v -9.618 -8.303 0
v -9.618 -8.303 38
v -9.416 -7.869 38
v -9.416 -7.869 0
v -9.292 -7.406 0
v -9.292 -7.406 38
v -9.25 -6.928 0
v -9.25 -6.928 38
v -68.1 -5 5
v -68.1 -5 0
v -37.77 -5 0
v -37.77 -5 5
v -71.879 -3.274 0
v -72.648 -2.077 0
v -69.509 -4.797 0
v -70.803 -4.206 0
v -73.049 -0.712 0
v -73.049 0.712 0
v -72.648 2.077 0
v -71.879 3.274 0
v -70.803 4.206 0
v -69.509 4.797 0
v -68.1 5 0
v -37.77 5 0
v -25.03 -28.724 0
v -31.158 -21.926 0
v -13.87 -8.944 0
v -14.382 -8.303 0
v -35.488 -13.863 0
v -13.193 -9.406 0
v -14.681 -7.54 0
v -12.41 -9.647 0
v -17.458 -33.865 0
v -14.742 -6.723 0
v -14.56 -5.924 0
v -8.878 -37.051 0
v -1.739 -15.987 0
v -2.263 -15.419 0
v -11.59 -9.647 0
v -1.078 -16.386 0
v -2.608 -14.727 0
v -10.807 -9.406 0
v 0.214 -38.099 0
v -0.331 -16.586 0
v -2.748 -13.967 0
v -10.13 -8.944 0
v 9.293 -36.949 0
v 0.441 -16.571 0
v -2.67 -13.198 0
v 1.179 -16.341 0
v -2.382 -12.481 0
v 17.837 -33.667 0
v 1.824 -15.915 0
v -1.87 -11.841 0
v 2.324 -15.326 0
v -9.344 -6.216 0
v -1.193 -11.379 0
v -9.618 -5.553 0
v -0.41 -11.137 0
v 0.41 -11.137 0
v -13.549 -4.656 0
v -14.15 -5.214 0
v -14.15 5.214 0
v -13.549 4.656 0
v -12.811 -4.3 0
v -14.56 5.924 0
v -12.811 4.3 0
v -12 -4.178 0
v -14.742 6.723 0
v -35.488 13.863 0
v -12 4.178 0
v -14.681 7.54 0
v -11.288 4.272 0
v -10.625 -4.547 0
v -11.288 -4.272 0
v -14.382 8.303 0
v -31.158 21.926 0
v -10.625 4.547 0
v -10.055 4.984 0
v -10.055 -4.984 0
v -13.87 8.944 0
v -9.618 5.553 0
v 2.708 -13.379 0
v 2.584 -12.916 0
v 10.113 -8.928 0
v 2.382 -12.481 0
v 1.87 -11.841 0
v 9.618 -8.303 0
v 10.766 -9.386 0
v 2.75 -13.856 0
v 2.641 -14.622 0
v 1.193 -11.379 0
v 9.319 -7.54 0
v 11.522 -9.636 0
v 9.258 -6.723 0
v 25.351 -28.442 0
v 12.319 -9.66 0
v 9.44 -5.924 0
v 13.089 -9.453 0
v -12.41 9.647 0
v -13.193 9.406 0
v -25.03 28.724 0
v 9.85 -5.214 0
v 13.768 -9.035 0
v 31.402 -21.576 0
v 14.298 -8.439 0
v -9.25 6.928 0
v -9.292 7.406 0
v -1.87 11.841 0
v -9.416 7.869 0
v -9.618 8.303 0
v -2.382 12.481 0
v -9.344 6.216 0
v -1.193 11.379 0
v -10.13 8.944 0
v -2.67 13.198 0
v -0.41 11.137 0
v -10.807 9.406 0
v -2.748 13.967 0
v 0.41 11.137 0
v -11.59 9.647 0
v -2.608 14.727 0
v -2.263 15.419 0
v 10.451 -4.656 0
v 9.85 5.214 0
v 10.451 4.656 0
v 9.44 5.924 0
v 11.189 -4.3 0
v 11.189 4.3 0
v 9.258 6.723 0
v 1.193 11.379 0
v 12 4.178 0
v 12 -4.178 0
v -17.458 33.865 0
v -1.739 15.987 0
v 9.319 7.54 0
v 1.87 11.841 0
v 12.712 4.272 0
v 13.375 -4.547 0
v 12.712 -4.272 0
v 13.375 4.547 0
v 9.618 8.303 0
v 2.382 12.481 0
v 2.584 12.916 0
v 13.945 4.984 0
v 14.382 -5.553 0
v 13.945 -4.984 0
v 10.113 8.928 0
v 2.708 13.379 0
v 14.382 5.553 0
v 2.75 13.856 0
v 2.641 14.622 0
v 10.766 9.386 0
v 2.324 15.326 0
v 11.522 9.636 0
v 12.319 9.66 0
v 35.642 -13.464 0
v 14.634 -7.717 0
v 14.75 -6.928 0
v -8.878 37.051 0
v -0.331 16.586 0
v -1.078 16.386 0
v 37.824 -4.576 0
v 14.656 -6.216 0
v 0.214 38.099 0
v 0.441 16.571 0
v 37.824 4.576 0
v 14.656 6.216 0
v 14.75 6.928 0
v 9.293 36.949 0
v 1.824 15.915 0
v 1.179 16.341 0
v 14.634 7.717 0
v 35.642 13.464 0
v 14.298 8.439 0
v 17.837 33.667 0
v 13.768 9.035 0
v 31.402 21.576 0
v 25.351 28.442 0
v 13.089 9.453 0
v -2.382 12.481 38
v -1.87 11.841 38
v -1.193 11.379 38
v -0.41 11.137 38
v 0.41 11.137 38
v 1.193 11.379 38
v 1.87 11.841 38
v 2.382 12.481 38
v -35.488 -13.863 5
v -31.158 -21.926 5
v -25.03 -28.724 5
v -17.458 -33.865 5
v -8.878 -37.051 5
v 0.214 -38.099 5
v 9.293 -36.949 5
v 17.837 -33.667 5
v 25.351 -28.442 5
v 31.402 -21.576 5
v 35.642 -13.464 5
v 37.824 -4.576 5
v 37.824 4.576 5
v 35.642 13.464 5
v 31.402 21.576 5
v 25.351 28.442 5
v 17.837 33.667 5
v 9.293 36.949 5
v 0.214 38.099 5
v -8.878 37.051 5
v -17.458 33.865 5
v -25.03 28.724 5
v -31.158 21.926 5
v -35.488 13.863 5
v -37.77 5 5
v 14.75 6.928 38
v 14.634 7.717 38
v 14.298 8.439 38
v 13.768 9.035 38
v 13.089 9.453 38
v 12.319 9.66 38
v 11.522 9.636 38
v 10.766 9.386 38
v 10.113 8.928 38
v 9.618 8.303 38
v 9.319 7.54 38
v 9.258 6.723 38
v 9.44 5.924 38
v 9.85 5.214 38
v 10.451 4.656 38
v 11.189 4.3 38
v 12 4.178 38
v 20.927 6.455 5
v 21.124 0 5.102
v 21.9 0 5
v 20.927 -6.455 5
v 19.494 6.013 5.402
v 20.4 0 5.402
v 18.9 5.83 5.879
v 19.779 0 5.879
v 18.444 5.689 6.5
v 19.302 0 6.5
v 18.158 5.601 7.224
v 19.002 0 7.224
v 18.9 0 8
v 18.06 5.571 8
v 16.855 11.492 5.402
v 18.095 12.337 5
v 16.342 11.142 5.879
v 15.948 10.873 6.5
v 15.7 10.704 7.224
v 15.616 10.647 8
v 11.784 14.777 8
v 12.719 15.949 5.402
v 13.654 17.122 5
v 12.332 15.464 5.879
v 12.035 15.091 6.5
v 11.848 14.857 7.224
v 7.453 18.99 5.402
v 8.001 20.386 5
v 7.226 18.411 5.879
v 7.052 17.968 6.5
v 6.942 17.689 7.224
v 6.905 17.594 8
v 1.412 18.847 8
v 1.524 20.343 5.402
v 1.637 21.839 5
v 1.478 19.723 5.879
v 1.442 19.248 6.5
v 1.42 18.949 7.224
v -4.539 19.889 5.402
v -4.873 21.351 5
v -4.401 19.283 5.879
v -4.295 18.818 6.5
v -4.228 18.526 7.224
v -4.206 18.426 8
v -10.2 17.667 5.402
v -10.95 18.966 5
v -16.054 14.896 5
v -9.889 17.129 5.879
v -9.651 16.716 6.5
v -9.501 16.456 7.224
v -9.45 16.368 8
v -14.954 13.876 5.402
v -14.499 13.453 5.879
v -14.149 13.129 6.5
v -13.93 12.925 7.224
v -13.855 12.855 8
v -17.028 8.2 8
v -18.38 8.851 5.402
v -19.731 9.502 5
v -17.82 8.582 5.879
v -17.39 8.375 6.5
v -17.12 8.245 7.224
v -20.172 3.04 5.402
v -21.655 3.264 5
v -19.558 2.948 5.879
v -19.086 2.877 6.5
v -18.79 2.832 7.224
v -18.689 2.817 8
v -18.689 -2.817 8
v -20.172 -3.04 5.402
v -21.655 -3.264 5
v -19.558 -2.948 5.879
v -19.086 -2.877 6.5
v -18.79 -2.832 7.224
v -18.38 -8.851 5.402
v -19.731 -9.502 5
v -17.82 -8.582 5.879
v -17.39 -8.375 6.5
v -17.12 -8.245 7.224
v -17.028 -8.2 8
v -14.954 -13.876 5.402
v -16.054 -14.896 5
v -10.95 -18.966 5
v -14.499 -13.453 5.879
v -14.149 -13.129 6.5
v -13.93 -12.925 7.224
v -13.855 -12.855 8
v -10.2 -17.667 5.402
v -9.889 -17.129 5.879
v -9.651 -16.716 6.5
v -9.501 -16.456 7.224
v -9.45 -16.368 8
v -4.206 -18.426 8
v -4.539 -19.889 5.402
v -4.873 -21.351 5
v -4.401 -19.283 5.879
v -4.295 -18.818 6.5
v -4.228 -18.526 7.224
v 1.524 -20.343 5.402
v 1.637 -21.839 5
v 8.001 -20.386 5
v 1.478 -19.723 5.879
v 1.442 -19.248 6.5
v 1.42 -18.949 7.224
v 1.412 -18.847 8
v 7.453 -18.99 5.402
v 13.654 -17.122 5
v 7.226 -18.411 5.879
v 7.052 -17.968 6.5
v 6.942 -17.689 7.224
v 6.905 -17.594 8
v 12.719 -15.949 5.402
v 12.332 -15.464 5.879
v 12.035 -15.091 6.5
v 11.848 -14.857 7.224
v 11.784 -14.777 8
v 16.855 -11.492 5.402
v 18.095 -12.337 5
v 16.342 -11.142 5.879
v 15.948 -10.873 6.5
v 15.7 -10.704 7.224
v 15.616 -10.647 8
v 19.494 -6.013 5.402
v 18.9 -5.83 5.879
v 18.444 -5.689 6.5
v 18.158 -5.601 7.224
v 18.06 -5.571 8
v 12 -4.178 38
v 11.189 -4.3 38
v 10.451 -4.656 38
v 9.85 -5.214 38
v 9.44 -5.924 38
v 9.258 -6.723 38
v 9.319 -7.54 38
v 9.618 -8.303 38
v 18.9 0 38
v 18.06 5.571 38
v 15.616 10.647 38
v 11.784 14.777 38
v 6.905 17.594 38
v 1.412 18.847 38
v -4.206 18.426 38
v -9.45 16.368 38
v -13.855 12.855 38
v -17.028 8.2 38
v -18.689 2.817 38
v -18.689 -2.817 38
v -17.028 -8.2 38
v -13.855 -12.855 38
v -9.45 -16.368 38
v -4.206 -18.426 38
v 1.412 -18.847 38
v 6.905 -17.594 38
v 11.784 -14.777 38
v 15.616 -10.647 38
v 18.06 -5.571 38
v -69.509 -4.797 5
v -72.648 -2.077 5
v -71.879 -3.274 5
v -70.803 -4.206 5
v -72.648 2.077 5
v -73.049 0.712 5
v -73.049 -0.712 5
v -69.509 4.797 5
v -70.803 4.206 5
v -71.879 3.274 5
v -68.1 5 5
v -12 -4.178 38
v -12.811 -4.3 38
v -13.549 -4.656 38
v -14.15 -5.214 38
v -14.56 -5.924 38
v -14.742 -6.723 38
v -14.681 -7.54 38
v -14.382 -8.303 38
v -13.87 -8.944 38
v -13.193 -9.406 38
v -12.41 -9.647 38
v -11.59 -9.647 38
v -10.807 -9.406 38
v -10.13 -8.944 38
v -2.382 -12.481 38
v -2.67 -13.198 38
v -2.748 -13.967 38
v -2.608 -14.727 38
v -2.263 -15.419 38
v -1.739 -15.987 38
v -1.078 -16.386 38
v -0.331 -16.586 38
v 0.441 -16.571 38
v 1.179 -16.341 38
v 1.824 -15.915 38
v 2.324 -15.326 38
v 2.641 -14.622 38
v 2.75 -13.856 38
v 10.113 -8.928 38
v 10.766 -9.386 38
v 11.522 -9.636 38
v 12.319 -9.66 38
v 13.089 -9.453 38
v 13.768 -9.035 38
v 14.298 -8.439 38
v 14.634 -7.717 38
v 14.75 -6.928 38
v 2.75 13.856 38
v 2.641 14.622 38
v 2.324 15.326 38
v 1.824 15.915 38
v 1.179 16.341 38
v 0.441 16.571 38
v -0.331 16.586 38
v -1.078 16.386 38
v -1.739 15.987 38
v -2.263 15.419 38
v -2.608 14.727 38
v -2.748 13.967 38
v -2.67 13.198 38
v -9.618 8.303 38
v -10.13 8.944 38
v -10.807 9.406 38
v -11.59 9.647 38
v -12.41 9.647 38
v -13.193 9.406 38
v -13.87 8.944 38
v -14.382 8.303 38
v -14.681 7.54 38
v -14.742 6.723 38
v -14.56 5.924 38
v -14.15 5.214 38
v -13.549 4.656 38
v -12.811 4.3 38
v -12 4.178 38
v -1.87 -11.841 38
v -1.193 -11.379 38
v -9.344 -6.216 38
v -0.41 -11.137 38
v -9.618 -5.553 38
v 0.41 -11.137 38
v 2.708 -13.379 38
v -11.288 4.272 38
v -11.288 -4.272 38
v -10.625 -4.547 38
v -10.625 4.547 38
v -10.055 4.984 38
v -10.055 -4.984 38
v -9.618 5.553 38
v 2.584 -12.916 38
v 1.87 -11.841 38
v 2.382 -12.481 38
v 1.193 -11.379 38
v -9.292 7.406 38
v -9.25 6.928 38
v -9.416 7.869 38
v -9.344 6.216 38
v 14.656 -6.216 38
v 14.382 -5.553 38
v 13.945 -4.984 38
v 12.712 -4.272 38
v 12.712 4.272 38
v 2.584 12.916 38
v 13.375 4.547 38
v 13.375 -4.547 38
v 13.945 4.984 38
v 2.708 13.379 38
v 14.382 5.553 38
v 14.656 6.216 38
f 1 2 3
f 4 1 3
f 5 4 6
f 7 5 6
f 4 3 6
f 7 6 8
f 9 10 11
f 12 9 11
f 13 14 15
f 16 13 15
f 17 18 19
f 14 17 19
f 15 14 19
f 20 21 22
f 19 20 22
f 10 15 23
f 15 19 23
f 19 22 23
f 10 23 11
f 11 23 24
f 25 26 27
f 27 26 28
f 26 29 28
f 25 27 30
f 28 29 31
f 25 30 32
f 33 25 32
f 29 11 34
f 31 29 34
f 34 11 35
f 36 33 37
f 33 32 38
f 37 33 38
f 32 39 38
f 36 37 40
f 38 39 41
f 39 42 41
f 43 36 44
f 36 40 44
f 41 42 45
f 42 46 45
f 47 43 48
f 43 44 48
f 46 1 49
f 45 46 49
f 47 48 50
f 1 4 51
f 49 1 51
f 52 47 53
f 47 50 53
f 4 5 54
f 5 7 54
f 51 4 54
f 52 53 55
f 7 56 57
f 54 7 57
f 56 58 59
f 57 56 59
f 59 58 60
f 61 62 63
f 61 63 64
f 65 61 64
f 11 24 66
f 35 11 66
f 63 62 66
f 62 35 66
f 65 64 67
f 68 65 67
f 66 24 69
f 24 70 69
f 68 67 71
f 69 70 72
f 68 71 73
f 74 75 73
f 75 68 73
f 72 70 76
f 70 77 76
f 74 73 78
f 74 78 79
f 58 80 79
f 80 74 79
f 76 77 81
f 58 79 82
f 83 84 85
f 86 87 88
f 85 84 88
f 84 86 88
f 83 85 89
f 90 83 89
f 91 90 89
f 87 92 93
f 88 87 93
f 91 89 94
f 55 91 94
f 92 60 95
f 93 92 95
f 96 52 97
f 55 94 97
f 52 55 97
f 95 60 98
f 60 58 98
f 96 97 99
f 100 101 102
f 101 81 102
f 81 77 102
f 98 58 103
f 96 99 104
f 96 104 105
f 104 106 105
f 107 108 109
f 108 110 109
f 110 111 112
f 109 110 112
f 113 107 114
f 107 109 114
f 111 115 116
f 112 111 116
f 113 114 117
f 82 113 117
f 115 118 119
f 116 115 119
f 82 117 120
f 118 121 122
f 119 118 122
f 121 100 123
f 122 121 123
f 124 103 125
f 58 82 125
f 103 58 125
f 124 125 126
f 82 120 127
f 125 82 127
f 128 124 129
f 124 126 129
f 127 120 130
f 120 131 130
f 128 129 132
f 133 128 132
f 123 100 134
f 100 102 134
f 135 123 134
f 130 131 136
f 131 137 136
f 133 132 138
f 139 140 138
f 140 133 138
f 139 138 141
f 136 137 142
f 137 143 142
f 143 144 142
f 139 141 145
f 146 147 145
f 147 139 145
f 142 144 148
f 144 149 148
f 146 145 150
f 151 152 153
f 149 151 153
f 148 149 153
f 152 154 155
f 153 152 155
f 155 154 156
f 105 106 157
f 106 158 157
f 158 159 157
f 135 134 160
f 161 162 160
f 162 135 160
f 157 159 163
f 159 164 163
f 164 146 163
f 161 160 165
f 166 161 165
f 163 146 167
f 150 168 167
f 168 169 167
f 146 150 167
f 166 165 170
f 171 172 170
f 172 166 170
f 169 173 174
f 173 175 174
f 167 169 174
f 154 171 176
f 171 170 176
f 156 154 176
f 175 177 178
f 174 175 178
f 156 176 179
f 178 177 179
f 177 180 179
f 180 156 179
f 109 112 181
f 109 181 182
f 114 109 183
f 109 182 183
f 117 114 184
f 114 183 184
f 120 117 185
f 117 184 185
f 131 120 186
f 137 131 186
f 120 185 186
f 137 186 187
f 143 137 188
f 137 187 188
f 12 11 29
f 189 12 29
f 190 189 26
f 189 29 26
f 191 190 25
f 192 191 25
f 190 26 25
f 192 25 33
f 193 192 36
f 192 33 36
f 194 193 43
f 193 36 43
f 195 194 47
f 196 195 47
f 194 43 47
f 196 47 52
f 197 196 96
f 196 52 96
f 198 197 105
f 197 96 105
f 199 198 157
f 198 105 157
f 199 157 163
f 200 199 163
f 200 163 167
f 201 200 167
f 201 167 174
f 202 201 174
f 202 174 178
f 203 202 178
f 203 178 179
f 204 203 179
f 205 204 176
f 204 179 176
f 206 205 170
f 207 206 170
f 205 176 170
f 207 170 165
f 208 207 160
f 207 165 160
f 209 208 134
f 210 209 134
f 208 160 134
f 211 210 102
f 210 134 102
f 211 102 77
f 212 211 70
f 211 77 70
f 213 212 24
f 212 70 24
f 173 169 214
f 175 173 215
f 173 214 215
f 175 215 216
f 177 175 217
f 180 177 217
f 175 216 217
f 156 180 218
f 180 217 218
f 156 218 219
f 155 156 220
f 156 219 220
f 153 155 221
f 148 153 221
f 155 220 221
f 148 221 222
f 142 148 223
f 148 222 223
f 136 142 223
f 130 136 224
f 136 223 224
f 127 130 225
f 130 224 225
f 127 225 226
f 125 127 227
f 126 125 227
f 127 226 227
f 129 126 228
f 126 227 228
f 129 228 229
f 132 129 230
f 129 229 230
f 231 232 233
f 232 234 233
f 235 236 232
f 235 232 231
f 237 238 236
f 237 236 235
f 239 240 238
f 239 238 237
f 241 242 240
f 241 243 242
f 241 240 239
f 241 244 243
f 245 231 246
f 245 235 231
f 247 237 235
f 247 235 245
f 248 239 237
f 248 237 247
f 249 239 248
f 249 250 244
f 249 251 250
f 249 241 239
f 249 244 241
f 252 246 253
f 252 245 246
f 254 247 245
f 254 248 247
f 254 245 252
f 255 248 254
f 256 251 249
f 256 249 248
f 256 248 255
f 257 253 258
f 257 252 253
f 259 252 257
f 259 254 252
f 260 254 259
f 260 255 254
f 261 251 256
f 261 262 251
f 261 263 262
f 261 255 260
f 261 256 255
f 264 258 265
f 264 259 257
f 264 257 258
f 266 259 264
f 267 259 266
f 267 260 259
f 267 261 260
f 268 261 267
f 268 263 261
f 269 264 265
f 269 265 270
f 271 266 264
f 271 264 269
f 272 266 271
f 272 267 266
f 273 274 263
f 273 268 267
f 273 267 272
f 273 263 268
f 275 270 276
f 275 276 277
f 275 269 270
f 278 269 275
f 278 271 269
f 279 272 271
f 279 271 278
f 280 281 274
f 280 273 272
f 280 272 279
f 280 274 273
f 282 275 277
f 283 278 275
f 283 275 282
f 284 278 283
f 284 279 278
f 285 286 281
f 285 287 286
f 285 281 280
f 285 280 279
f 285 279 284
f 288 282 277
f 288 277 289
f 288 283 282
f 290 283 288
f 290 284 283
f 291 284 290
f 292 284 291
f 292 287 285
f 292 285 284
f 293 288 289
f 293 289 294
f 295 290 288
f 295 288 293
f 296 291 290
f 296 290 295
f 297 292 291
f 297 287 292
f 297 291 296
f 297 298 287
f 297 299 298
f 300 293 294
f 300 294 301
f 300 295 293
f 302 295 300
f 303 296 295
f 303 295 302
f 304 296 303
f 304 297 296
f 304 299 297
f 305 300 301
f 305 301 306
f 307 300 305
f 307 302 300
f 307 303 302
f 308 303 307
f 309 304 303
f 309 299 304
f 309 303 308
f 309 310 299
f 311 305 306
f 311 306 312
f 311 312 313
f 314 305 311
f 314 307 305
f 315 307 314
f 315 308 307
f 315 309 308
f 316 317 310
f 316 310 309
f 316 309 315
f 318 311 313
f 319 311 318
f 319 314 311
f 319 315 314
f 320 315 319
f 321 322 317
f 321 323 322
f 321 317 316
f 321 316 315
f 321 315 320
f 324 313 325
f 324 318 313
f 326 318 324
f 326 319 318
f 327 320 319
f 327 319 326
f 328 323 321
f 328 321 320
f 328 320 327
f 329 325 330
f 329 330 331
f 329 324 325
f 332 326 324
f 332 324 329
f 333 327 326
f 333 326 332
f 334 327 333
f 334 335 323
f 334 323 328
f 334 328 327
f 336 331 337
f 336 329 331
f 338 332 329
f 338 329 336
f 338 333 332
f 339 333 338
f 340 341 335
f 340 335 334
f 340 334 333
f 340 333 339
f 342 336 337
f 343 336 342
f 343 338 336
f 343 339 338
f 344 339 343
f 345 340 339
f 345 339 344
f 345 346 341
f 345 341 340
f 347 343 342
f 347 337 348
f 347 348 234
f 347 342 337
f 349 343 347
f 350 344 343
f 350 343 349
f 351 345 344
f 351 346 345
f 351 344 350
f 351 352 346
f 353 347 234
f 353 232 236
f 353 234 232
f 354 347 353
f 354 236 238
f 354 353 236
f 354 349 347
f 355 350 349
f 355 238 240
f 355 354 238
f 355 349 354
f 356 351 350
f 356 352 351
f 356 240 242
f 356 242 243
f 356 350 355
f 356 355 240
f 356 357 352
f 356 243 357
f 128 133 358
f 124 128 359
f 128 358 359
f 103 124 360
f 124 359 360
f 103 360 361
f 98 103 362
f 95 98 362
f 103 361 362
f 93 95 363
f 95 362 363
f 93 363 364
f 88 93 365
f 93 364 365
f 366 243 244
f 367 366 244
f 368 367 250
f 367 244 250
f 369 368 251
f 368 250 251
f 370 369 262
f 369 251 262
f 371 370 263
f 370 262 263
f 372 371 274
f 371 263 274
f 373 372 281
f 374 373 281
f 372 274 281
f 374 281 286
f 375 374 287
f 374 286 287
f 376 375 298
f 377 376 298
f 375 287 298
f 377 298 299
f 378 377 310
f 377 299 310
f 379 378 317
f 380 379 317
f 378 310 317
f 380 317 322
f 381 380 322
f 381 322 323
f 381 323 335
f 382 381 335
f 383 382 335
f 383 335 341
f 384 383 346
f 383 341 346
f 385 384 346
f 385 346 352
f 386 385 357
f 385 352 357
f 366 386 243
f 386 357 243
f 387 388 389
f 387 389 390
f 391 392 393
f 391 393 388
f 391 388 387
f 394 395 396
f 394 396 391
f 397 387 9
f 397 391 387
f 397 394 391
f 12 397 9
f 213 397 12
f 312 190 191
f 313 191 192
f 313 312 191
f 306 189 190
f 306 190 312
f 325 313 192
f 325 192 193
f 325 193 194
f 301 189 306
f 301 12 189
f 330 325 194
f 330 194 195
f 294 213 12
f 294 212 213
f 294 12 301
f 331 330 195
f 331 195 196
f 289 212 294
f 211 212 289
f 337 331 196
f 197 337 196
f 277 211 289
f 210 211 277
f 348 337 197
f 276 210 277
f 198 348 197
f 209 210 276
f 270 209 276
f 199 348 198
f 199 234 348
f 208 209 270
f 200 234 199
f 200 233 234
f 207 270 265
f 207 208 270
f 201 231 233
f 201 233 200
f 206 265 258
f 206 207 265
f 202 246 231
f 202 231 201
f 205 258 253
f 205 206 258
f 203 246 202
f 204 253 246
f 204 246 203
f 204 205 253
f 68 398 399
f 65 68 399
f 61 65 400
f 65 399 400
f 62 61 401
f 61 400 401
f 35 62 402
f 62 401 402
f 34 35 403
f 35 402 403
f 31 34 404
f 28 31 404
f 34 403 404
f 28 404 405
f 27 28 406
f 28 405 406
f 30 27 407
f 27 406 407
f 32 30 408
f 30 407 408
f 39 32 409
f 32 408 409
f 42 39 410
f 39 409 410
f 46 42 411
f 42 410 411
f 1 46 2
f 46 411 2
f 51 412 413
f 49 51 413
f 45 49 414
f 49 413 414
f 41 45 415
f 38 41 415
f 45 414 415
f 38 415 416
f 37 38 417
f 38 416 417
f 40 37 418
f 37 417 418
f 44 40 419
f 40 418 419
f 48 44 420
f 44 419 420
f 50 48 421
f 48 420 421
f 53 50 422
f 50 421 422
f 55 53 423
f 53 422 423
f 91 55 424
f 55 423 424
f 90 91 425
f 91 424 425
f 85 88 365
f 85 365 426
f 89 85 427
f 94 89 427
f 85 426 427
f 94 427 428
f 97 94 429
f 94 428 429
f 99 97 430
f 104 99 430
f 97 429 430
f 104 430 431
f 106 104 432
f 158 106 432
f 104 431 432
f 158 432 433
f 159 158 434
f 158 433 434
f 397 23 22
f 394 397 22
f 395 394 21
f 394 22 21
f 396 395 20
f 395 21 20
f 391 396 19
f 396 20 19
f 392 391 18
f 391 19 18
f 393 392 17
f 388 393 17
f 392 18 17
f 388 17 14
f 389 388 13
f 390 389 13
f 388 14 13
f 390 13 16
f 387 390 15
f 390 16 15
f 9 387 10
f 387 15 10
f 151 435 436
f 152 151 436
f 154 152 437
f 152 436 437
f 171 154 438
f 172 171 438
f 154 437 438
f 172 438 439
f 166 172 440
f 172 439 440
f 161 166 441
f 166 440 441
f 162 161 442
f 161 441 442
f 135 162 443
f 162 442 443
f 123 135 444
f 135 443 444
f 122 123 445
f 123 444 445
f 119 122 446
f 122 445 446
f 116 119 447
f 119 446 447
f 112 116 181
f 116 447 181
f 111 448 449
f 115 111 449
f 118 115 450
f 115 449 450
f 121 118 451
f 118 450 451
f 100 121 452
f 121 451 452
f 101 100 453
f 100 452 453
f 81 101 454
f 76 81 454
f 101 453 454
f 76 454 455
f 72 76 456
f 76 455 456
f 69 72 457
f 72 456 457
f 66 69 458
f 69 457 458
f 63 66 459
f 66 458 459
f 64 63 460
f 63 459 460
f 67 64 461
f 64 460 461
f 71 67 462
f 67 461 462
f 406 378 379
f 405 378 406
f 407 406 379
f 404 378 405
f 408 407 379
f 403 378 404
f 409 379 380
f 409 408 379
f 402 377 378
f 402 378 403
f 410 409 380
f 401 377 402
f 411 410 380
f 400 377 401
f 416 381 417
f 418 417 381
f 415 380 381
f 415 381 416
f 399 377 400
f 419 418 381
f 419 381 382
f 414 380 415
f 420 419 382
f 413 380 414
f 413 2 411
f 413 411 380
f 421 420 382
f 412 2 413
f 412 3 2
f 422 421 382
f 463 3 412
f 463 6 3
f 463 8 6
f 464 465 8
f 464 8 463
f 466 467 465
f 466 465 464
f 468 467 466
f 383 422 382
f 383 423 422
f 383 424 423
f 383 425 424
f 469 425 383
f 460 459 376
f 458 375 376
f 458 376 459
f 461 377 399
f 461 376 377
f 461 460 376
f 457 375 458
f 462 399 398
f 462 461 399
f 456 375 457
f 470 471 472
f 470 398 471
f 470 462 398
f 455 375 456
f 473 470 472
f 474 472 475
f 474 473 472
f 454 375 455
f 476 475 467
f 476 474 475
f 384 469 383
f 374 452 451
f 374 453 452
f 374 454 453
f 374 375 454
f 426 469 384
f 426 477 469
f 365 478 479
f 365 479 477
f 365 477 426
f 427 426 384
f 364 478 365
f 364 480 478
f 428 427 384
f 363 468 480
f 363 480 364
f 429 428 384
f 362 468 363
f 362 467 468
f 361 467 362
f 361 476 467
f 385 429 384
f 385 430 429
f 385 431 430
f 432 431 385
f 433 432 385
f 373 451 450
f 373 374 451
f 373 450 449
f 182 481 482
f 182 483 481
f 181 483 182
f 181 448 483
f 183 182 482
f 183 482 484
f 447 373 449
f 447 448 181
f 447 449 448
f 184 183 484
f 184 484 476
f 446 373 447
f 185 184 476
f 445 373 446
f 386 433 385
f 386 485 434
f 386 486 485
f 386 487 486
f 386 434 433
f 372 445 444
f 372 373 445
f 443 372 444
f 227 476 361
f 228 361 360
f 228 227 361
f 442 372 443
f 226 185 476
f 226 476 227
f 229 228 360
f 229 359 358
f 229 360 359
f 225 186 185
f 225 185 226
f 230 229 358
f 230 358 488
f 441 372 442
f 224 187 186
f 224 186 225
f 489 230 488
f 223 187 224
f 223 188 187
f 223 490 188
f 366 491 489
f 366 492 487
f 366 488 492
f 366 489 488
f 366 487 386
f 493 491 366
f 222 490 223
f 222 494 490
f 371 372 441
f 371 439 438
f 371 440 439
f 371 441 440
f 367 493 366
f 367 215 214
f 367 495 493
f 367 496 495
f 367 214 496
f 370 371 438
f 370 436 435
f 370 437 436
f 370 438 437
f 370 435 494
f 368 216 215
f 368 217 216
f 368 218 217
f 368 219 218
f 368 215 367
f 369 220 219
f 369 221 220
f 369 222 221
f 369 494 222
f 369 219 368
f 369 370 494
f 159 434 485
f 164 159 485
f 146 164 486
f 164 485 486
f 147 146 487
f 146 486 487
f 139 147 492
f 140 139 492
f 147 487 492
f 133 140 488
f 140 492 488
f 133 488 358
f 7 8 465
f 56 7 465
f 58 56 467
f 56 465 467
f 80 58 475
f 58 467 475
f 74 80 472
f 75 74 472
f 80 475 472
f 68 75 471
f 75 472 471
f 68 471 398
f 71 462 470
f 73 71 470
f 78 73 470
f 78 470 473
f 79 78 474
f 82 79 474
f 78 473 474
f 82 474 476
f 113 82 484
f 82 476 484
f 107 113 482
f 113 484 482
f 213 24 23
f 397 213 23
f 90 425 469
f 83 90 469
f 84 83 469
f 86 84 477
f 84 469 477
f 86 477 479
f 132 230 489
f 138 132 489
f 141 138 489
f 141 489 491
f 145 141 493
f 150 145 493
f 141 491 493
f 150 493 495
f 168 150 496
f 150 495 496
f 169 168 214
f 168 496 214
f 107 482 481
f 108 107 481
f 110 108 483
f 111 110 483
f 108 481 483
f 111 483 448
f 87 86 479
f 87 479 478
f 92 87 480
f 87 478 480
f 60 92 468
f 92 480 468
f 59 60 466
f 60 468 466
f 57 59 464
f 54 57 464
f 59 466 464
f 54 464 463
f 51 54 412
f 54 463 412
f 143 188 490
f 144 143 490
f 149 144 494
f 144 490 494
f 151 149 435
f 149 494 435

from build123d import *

# Parameters (mm, degrees)
SKETCH4_R           = 38.1
BOSS_EXTRUDE3_DEPTH = 5
SKETCH5_R           = 18.9
BOSS_EXTRUDE4_DEPTH = 33
FILLET4_R           = 3
CUT_EXTRUDE4_DEPTH  = 39.48


with BuildPart() as part:
    # Sketch4 → Boss-Extrude3 (new body)
    with BuildSketch(Plane.XY):
        Circle(SKETCH4_R)
        with BuildLine():
            Line((-68.1, 0), (-38.1, 0))
            ThreePointArc((-38.1, 0), (-38.017533534, 2.505422923), (-37.770491127, 5))
            Line((-37.770491127, 5), (-68.1, 5))
            Line((-68.1, 5), (-68.1, 0))
        make_face()
        with BuildLine():
            ThreePointArc((-37.770491127, -5), (-38.017533534, -2.505422923), (-38.1, 0))
            Line((-38.1, 0), (-68.1, 0))
            Line((-68.1, 0), (-68.1, -5))
            Line((-68.1, -5), (-37.770491127, -5))
        make_face()
        with BuildLine():
            Line((-68.1, 0), (-68.1, 5))
            ThreePointArc((-68.1, 5), (-73.1, 0), (-68.1, -5))
            Line((-68.1, -5), (-68.1, 0))
        make_face()
    extrude(amount=BOSS_EXTRUDE3_DEPTH)

    # Sketch5 → Boss-Extrude4 (add)
    with BuildSketch(Plane.XY.offset(5)):
        Circle(SKETCH5_R)
    extrude(amount=BOSS_EXTRUDE4_DEPTH)

    # Fillet4
    fillet4_edges = [part.edges().sort_by_distance(p)[0] for p in [
        (-18.9, 0, 5),
    ]]
    fillet(fillet4_edges, radius=FILLET4_R)

    # Sketch6 → Cut-Extrude4 (cut)
    with BuildSketch(Plane.XY.offset(38)):
        with BuildLine():
            Line((2.38156986, 12.481406461), (0, 13.856406461))
            Line((0, 13.856406461), (-2.38156986, 12.481406461))
            ThreePointArc((-2.38156986, 12.481406461), (0, 11.106406461), (2.38156986, 12.481406461))
        make_face()
        with BuildLine():
            Line((-2.38156986, 12.481406461), (0, 13.856406461))
            Line((0, 13.856406461), (2.38156986, 12.481406461))
            ThreePointArc((2.38156986, 12.481406461), (2.656296022, 13.144654087), (2.75, 13.856406461))
            ThreePointArc((2.75, 13.856406461), (-0.711752374, 16.512702483), (-2.38156986, 12.481406461))
        make_face()
        with BuildLine():
            ThreePointArc((14.75, 6.92820323), (12.711752374, 9.584499253), (9.61843014, 8.30320323))
            Line((9.61843014, 8.30320323), (12, 6.92820323))
            Line((12, 6.92820323), (12, 4.17820323))
            ThreePointArc((12, 4.17820323), (13.944543648, 4.983659582), (14.75, 6.92820323))
        make_face()
        with BuildLine():
            Line((12, 6.92820323), (9.61843014, 8.30320323))
            ThreePointArc((9.61843014, 8.30320323), (9.61843014, 5.55320323), (12, 4.17820323))
            Line((12, 4.17820323), (12, 6.92820323))
        make_face()
        with BuildLine():
            ThreePointArc((14.75, -6.92820323), (13.944543648, -4.983659582), (12, -4.17820323))
            Line((12, -4.17820323), (12, -6.92820323))
            Line((12, -6.92820323), (9.61843014, -8.30320323))
            ThreePointArc((9.61843014, -8.30320323), (12.711752374, -9.584499253), (14.75, -6.92820323))
        make_face()
        with BuildLine():
            Line((12, -6.92820323), (12, -4.17820323))
            ThreePointArc((12, -4.17820323), (9.61843014, -5.55320323), (9.61843014, -8.30320323))
            Line((9.61843014, -8.30320323), (12, -6.92820323))
        make_face()
        with BuildLine():
            ThreePointArc((-9.25, 6.92820323), (-9.343703978, 7.639955604), (-9.61843014, 8.30320323))
            Line((-9.61843014, 8.30320323), (-12, 6.92820323))
            Line((-12, 6.92820323), (-12, 4.17820323))
            ThreePointArc((-12, 4.17820323), (-10.055456352, 4.983659582), (-9.25, 6.92820323))
        make_face()
        with BuildLine():
            Line((-12, 6.92820323), (-9.61843014, 8.30320323))
            ThreePointArc((-9.61843014, 8.30320323), (-14.38156986, 8.30320323), (-12, 4.17820323))
            Line((-12, 4.17820323), (-12, 6.92820323))
        make_face()
        with BuildLine():
            ThreePointArc((-9.25, -6.92820323), (-10.055456352, -4.983659582), (-12, -4.17820323))
            Line((-12, -4.17820323), (-12, -6.92820323))
            Line((-12, -6.92820323), (-9.61843014, -8.30320323))
            ThreePointArc((-9.61843014, -8.30320323), (-9.343703978, -7.639955604), (-9.25, -6.92820323))
        make_face()
        with BuildLine():
            Line((-12, -6.92820323), (-12, -4.17820323))
            ThreePointArc((-12, -4.17820323), (-14.38156986, -8.30320323), (-9.61843014, -8.30320323))
            Line((-9.61843014, -8.30320323), (-12, -6.92820323))
        make_face()
        with BuildLine():
            ThreePointArc((2.38156986, -12.481406461), (0, -11.106406461), (-2.38156986, -12.481406461))
            Line((-2.38156986, -12.481406461), (0, -13.856406461))
            Line((0, -13.856406461), (2.38156986, -12.481406461))
        make_face()
        with BuildLine():
            Line((0, -13.856406461), (-2.38156986, -12.481406461))
            ThreePointArc((-2.38156986, -12.481406461), (-0.711752374, -16.512702483), (2.75, -13.856406461))
            ThreePointArc((2.75, -13.856406461), (2.656296022, -13.144654087), (2.38156986, -12.481406461))
            Line((2.38156986, -12.481406461), (0, -13.856406461))
        make_face()
    extrude(amount=-CUT_EXTRUDE4_DEPTH, mode=Mode.SUBTRACT)


solid = part.part
